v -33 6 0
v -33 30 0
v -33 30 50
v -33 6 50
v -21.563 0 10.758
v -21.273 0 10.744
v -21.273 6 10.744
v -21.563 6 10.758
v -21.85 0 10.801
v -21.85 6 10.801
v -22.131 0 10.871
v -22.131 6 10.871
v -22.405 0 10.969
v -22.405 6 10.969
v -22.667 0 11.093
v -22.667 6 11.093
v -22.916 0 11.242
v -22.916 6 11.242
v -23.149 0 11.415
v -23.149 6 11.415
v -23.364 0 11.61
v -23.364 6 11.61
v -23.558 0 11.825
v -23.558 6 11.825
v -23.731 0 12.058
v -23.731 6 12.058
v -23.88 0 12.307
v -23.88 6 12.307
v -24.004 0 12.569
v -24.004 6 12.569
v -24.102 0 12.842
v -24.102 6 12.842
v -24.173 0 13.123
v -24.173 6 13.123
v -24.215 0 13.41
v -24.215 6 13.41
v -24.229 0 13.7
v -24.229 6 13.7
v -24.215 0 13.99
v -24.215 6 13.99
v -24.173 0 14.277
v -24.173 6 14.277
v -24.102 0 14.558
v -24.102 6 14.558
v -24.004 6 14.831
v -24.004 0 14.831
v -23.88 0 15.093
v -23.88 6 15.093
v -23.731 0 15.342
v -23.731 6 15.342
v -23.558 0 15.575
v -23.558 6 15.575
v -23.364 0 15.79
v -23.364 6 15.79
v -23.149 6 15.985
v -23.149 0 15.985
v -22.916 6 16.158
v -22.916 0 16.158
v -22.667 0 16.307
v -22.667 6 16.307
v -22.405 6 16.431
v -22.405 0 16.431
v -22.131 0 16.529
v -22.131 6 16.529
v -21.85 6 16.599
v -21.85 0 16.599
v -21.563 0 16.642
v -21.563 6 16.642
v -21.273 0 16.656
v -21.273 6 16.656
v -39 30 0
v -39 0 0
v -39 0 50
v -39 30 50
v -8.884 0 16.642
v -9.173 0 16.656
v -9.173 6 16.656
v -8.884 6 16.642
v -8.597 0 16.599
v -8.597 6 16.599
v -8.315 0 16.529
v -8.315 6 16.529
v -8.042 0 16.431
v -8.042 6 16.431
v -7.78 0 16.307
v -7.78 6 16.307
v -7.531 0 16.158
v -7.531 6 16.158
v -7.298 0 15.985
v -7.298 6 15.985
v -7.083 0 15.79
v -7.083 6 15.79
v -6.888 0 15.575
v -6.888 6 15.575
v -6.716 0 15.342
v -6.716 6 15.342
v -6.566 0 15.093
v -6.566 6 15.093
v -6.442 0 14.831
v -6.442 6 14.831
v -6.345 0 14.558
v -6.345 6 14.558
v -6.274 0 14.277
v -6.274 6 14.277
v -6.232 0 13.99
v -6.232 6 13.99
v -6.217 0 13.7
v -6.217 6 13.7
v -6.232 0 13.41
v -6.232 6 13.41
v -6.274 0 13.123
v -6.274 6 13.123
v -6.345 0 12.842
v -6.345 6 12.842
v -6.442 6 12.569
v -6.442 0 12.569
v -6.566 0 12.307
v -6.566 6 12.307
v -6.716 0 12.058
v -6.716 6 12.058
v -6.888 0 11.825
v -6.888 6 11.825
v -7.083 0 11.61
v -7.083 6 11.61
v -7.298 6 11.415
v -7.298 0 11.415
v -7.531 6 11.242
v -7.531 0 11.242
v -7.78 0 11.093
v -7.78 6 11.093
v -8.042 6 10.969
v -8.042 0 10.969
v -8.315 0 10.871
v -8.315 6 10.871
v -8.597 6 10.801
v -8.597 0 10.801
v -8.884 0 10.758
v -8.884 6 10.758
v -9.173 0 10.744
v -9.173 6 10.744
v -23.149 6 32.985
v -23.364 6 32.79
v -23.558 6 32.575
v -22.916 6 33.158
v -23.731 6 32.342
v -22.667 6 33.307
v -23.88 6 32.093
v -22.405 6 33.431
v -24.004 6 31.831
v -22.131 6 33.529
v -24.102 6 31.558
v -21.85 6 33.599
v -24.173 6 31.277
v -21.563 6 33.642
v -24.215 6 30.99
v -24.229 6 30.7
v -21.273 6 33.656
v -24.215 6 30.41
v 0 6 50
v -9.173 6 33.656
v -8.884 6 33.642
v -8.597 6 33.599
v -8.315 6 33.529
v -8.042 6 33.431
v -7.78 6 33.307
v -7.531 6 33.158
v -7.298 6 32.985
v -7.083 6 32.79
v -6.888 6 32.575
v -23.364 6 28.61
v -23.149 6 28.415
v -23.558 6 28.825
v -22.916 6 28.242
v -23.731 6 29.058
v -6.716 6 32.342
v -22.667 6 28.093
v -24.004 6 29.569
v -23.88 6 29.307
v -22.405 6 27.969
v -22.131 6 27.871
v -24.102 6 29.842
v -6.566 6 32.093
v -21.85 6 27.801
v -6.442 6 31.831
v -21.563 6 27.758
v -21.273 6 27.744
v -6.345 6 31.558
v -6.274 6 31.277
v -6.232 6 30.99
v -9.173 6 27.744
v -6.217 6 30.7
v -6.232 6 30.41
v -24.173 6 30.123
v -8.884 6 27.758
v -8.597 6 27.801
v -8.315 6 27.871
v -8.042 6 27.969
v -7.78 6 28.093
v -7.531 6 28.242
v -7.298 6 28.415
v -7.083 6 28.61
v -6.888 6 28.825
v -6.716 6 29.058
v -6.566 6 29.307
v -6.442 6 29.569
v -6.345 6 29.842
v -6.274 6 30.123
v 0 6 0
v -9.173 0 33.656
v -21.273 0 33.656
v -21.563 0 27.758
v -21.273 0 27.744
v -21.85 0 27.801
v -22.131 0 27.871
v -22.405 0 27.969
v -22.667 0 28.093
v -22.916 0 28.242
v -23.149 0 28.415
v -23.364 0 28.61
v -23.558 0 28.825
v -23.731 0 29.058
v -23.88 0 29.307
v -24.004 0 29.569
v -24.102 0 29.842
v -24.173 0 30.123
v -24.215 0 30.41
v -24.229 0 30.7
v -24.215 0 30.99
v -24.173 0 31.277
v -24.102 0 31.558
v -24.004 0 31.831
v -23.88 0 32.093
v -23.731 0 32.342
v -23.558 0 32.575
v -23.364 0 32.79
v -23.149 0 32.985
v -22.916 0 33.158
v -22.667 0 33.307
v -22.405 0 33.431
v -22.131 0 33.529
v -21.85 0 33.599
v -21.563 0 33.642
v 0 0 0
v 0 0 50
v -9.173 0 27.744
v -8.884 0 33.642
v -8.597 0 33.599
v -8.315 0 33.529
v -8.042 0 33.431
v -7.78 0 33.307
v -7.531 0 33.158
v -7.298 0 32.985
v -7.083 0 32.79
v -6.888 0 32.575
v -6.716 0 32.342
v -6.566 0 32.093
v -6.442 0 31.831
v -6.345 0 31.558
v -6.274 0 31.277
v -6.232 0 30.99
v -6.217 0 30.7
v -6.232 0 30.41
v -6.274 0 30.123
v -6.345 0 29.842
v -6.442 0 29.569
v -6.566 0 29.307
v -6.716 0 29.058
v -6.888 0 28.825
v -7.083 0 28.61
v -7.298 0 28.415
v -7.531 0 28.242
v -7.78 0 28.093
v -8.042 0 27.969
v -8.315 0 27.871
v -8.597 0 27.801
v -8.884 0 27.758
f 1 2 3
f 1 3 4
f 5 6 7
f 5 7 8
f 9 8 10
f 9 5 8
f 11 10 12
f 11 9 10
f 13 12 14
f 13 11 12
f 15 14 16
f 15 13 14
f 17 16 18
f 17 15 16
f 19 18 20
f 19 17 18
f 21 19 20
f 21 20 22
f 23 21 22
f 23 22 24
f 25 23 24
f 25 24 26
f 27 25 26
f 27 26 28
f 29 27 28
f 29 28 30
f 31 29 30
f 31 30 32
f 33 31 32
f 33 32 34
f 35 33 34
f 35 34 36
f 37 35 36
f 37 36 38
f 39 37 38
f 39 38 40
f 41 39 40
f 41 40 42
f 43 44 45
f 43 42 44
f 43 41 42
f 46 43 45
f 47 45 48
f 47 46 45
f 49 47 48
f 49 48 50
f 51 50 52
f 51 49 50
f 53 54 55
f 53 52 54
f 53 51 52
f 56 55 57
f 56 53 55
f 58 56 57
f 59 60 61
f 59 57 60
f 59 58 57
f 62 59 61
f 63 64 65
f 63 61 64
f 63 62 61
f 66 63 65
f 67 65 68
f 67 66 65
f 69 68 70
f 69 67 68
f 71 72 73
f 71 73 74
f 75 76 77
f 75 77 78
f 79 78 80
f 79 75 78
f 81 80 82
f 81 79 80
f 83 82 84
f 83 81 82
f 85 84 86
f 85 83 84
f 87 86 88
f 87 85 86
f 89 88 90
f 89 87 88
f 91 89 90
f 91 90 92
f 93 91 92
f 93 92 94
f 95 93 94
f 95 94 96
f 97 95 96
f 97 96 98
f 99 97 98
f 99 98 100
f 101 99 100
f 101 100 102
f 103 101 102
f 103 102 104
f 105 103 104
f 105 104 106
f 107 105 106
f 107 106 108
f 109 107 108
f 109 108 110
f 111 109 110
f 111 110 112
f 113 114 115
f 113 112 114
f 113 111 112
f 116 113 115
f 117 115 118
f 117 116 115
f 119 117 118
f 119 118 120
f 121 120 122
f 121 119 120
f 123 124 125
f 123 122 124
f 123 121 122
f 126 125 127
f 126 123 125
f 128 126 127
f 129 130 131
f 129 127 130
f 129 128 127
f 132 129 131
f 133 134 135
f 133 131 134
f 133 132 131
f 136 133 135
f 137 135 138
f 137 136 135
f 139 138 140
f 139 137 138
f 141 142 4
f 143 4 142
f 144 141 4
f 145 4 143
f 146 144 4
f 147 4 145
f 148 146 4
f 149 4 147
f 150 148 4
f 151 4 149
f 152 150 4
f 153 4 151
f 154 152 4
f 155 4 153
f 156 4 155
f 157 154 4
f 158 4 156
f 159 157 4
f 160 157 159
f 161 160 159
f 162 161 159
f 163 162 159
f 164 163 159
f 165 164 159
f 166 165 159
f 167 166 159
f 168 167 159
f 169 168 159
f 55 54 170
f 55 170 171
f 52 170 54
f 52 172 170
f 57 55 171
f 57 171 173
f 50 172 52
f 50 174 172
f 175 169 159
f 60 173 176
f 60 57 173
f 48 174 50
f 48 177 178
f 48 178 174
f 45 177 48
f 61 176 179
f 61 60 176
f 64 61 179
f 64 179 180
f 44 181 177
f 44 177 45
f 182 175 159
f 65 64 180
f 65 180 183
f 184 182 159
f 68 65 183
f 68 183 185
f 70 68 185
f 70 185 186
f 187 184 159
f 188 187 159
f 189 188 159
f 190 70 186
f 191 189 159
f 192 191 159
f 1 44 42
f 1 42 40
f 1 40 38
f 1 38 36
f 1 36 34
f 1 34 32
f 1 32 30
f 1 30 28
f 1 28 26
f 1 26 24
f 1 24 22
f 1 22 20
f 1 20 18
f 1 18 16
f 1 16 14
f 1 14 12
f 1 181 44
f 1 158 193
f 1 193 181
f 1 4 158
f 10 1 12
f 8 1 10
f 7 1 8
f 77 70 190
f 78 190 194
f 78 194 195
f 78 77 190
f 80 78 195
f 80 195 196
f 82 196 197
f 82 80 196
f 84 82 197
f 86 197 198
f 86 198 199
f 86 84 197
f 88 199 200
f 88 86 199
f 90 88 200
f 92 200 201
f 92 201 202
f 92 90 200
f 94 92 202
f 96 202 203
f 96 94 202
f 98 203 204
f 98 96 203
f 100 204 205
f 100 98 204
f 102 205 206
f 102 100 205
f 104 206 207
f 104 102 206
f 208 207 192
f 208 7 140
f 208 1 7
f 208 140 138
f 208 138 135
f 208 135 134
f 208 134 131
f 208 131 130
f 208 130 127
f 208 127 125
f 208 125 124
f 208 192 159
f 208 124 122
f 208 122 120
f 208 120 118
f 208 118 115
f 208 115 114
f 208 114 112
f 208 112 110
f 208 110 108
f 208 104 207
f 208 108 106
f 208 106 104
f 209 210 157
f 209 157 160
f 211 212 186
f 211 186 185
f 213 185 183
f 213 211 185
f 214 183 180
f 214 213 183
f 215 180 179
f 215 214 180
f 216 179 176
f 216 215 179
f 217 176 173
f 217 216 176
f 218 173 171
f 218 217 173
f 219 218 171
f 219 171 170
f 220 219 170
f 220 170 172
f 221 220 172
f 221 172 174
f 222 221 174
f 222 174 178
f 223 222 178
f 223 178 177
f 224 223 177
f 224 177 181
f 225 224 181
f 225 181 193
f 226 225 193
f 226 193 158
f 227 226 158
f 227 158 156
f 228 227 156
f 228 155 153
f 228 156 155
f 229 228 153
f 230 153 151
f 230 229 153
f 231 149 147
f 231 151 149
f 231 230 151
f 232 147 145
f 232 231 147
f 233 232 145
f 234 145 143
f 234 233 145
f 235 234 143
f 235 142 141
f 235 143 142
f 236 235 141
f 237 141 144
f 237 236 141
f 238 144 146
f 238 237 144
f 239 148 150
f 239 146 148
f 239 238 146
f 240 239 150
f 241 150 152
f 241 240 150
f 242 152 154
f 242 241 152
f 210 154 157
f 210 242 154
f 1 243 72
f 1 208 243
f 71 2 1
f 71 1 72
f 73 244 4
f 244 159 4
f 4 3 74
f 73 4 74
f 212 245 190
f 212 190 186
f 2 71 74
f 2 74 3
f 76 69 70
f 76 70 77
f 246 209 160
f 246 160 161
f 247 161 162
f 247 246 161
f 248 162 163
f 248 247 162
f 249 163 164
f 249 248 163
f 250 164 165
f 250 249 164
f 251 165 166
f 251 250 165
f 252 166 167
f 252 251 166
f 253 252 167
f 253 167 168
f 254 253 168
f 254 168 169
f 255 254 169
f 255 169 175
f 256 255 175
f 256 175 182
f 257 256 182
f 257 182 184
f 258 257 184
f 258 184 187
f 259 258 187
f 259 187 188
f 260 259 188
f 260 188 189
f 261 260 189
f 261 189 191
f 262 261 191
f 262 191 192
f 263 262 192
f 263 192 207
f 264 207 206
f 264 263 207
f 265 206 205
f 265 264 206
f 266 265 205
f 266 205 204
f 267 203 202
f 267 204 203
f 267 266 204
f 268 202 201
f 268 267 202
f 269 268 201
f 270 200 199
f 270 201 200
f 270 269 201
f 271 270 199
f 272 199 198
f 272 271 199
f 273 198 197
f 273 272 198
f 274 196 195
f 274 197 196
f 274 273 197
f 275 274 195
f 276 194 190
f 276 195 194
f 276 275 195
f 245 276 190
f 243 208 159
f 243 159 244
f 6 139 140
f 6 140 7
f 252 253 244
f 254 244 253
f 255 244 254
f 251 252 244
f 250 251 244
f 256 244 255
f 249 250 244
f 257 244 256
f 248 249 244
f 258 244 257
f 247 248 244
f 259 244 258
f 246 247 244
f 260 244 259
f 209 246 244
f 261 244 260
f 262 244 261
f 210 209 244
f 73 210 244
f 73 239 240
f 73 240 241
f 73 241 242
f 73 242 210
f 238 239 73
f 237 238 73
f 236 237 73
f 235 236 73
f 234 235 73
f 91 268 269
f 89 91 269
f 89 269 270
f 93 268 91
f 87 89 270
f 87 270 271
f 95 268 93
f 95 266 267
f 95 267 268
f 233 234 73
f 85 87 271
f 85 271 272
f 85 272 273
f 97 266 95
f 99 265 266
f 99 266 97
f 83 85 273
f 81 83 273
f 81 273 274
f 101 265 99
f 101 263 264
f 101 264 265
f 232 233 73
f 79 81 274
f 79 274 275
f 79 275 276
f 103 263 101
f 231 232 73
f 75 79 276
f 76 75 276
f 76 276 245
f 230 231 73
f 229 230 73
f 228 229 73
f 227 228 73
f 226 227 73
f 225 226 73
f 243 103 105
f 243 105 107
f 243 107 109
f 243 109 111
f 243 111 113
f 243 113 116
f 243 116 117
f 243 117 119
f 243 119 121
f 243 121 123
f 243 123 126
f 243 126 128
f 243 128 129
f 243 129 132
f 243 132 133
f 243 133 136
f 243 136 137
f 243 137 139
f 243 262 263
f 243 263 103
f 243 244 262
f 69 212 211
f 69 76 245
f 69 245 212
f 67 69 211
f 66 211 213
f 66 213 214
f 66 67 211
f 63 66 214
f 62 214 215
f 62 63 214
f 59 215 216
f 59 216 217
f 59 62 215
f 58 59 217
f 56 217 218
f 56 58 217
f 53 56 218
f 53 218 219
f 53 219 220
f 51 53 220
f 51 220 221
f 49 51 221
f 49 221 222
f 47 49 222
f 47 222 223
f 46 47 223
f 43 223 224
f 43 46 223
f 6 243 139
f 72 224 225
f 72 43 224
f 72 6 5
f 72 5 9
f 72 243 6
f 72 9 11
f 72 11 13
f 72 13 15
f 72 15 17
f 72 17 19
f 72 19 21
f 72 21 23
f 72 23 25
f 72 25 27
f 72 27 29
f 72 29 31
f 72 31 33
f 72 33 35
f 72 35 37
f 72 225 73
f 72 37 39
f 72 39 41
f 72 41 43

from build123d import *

# Parameters (mm, degrees)
BOSS_EXTRUDE1_DEPTH = 50
CUT_EXTRUDE1_DEPTH  = 14


with BuildPart() as part:
    # Sketch1 → Boss-Extrude1 (new body)
    with BuildSketch(Plane.XY):
        Polygon((0, 0), (-39, 0), (-39, 30), (-33, 30), (-33, 6), (0, 6), align=None)
    extrude(amount=BOSS_EXTRUDE1_DEPTH)

    # Sketch2 → Cut-Extrude1 (cut)
    with BuildSketch(Plane.XZ):
        with BuildLine():
            Line((-21.273396894, 33.65603272), (-9.173396894, 33.65603272))
            ThreePointArc((-9.173396894, 33.65603272), (-6.217364174, 30.7), (-9.173396894, 27.74396728))
            Line((-9.173396894, 27.74396728), (-21.273396894, 27.74396728))
            ThreePointArc((-21.273396894, 27.74396728), (-24.229429614, 30.7), (-21.273396894, 33.65603272))
        make_face()
        with BuildLine():
            Line((-21.273396894, 16.65603272), (-9.173396894, 16.65603272))
            ThreePointArc((-9.173396894, 16.65603272), (-6.217364174, 13.7), (-9.173396894, 10.74396728))
            Line((-9.173396894, 10.74396728), (-21.273396894, 10.74396728))
            ThreePointArc((-21.273396894, 10.74396728), (-24.229429614, 13.7), (-21.273396894, 16.65603272))
        make_face()
    extrude(amount=-CUT_EXTRUDE1_DEPTH, mode=Mode.SUBTRACT)


solid = part.part
